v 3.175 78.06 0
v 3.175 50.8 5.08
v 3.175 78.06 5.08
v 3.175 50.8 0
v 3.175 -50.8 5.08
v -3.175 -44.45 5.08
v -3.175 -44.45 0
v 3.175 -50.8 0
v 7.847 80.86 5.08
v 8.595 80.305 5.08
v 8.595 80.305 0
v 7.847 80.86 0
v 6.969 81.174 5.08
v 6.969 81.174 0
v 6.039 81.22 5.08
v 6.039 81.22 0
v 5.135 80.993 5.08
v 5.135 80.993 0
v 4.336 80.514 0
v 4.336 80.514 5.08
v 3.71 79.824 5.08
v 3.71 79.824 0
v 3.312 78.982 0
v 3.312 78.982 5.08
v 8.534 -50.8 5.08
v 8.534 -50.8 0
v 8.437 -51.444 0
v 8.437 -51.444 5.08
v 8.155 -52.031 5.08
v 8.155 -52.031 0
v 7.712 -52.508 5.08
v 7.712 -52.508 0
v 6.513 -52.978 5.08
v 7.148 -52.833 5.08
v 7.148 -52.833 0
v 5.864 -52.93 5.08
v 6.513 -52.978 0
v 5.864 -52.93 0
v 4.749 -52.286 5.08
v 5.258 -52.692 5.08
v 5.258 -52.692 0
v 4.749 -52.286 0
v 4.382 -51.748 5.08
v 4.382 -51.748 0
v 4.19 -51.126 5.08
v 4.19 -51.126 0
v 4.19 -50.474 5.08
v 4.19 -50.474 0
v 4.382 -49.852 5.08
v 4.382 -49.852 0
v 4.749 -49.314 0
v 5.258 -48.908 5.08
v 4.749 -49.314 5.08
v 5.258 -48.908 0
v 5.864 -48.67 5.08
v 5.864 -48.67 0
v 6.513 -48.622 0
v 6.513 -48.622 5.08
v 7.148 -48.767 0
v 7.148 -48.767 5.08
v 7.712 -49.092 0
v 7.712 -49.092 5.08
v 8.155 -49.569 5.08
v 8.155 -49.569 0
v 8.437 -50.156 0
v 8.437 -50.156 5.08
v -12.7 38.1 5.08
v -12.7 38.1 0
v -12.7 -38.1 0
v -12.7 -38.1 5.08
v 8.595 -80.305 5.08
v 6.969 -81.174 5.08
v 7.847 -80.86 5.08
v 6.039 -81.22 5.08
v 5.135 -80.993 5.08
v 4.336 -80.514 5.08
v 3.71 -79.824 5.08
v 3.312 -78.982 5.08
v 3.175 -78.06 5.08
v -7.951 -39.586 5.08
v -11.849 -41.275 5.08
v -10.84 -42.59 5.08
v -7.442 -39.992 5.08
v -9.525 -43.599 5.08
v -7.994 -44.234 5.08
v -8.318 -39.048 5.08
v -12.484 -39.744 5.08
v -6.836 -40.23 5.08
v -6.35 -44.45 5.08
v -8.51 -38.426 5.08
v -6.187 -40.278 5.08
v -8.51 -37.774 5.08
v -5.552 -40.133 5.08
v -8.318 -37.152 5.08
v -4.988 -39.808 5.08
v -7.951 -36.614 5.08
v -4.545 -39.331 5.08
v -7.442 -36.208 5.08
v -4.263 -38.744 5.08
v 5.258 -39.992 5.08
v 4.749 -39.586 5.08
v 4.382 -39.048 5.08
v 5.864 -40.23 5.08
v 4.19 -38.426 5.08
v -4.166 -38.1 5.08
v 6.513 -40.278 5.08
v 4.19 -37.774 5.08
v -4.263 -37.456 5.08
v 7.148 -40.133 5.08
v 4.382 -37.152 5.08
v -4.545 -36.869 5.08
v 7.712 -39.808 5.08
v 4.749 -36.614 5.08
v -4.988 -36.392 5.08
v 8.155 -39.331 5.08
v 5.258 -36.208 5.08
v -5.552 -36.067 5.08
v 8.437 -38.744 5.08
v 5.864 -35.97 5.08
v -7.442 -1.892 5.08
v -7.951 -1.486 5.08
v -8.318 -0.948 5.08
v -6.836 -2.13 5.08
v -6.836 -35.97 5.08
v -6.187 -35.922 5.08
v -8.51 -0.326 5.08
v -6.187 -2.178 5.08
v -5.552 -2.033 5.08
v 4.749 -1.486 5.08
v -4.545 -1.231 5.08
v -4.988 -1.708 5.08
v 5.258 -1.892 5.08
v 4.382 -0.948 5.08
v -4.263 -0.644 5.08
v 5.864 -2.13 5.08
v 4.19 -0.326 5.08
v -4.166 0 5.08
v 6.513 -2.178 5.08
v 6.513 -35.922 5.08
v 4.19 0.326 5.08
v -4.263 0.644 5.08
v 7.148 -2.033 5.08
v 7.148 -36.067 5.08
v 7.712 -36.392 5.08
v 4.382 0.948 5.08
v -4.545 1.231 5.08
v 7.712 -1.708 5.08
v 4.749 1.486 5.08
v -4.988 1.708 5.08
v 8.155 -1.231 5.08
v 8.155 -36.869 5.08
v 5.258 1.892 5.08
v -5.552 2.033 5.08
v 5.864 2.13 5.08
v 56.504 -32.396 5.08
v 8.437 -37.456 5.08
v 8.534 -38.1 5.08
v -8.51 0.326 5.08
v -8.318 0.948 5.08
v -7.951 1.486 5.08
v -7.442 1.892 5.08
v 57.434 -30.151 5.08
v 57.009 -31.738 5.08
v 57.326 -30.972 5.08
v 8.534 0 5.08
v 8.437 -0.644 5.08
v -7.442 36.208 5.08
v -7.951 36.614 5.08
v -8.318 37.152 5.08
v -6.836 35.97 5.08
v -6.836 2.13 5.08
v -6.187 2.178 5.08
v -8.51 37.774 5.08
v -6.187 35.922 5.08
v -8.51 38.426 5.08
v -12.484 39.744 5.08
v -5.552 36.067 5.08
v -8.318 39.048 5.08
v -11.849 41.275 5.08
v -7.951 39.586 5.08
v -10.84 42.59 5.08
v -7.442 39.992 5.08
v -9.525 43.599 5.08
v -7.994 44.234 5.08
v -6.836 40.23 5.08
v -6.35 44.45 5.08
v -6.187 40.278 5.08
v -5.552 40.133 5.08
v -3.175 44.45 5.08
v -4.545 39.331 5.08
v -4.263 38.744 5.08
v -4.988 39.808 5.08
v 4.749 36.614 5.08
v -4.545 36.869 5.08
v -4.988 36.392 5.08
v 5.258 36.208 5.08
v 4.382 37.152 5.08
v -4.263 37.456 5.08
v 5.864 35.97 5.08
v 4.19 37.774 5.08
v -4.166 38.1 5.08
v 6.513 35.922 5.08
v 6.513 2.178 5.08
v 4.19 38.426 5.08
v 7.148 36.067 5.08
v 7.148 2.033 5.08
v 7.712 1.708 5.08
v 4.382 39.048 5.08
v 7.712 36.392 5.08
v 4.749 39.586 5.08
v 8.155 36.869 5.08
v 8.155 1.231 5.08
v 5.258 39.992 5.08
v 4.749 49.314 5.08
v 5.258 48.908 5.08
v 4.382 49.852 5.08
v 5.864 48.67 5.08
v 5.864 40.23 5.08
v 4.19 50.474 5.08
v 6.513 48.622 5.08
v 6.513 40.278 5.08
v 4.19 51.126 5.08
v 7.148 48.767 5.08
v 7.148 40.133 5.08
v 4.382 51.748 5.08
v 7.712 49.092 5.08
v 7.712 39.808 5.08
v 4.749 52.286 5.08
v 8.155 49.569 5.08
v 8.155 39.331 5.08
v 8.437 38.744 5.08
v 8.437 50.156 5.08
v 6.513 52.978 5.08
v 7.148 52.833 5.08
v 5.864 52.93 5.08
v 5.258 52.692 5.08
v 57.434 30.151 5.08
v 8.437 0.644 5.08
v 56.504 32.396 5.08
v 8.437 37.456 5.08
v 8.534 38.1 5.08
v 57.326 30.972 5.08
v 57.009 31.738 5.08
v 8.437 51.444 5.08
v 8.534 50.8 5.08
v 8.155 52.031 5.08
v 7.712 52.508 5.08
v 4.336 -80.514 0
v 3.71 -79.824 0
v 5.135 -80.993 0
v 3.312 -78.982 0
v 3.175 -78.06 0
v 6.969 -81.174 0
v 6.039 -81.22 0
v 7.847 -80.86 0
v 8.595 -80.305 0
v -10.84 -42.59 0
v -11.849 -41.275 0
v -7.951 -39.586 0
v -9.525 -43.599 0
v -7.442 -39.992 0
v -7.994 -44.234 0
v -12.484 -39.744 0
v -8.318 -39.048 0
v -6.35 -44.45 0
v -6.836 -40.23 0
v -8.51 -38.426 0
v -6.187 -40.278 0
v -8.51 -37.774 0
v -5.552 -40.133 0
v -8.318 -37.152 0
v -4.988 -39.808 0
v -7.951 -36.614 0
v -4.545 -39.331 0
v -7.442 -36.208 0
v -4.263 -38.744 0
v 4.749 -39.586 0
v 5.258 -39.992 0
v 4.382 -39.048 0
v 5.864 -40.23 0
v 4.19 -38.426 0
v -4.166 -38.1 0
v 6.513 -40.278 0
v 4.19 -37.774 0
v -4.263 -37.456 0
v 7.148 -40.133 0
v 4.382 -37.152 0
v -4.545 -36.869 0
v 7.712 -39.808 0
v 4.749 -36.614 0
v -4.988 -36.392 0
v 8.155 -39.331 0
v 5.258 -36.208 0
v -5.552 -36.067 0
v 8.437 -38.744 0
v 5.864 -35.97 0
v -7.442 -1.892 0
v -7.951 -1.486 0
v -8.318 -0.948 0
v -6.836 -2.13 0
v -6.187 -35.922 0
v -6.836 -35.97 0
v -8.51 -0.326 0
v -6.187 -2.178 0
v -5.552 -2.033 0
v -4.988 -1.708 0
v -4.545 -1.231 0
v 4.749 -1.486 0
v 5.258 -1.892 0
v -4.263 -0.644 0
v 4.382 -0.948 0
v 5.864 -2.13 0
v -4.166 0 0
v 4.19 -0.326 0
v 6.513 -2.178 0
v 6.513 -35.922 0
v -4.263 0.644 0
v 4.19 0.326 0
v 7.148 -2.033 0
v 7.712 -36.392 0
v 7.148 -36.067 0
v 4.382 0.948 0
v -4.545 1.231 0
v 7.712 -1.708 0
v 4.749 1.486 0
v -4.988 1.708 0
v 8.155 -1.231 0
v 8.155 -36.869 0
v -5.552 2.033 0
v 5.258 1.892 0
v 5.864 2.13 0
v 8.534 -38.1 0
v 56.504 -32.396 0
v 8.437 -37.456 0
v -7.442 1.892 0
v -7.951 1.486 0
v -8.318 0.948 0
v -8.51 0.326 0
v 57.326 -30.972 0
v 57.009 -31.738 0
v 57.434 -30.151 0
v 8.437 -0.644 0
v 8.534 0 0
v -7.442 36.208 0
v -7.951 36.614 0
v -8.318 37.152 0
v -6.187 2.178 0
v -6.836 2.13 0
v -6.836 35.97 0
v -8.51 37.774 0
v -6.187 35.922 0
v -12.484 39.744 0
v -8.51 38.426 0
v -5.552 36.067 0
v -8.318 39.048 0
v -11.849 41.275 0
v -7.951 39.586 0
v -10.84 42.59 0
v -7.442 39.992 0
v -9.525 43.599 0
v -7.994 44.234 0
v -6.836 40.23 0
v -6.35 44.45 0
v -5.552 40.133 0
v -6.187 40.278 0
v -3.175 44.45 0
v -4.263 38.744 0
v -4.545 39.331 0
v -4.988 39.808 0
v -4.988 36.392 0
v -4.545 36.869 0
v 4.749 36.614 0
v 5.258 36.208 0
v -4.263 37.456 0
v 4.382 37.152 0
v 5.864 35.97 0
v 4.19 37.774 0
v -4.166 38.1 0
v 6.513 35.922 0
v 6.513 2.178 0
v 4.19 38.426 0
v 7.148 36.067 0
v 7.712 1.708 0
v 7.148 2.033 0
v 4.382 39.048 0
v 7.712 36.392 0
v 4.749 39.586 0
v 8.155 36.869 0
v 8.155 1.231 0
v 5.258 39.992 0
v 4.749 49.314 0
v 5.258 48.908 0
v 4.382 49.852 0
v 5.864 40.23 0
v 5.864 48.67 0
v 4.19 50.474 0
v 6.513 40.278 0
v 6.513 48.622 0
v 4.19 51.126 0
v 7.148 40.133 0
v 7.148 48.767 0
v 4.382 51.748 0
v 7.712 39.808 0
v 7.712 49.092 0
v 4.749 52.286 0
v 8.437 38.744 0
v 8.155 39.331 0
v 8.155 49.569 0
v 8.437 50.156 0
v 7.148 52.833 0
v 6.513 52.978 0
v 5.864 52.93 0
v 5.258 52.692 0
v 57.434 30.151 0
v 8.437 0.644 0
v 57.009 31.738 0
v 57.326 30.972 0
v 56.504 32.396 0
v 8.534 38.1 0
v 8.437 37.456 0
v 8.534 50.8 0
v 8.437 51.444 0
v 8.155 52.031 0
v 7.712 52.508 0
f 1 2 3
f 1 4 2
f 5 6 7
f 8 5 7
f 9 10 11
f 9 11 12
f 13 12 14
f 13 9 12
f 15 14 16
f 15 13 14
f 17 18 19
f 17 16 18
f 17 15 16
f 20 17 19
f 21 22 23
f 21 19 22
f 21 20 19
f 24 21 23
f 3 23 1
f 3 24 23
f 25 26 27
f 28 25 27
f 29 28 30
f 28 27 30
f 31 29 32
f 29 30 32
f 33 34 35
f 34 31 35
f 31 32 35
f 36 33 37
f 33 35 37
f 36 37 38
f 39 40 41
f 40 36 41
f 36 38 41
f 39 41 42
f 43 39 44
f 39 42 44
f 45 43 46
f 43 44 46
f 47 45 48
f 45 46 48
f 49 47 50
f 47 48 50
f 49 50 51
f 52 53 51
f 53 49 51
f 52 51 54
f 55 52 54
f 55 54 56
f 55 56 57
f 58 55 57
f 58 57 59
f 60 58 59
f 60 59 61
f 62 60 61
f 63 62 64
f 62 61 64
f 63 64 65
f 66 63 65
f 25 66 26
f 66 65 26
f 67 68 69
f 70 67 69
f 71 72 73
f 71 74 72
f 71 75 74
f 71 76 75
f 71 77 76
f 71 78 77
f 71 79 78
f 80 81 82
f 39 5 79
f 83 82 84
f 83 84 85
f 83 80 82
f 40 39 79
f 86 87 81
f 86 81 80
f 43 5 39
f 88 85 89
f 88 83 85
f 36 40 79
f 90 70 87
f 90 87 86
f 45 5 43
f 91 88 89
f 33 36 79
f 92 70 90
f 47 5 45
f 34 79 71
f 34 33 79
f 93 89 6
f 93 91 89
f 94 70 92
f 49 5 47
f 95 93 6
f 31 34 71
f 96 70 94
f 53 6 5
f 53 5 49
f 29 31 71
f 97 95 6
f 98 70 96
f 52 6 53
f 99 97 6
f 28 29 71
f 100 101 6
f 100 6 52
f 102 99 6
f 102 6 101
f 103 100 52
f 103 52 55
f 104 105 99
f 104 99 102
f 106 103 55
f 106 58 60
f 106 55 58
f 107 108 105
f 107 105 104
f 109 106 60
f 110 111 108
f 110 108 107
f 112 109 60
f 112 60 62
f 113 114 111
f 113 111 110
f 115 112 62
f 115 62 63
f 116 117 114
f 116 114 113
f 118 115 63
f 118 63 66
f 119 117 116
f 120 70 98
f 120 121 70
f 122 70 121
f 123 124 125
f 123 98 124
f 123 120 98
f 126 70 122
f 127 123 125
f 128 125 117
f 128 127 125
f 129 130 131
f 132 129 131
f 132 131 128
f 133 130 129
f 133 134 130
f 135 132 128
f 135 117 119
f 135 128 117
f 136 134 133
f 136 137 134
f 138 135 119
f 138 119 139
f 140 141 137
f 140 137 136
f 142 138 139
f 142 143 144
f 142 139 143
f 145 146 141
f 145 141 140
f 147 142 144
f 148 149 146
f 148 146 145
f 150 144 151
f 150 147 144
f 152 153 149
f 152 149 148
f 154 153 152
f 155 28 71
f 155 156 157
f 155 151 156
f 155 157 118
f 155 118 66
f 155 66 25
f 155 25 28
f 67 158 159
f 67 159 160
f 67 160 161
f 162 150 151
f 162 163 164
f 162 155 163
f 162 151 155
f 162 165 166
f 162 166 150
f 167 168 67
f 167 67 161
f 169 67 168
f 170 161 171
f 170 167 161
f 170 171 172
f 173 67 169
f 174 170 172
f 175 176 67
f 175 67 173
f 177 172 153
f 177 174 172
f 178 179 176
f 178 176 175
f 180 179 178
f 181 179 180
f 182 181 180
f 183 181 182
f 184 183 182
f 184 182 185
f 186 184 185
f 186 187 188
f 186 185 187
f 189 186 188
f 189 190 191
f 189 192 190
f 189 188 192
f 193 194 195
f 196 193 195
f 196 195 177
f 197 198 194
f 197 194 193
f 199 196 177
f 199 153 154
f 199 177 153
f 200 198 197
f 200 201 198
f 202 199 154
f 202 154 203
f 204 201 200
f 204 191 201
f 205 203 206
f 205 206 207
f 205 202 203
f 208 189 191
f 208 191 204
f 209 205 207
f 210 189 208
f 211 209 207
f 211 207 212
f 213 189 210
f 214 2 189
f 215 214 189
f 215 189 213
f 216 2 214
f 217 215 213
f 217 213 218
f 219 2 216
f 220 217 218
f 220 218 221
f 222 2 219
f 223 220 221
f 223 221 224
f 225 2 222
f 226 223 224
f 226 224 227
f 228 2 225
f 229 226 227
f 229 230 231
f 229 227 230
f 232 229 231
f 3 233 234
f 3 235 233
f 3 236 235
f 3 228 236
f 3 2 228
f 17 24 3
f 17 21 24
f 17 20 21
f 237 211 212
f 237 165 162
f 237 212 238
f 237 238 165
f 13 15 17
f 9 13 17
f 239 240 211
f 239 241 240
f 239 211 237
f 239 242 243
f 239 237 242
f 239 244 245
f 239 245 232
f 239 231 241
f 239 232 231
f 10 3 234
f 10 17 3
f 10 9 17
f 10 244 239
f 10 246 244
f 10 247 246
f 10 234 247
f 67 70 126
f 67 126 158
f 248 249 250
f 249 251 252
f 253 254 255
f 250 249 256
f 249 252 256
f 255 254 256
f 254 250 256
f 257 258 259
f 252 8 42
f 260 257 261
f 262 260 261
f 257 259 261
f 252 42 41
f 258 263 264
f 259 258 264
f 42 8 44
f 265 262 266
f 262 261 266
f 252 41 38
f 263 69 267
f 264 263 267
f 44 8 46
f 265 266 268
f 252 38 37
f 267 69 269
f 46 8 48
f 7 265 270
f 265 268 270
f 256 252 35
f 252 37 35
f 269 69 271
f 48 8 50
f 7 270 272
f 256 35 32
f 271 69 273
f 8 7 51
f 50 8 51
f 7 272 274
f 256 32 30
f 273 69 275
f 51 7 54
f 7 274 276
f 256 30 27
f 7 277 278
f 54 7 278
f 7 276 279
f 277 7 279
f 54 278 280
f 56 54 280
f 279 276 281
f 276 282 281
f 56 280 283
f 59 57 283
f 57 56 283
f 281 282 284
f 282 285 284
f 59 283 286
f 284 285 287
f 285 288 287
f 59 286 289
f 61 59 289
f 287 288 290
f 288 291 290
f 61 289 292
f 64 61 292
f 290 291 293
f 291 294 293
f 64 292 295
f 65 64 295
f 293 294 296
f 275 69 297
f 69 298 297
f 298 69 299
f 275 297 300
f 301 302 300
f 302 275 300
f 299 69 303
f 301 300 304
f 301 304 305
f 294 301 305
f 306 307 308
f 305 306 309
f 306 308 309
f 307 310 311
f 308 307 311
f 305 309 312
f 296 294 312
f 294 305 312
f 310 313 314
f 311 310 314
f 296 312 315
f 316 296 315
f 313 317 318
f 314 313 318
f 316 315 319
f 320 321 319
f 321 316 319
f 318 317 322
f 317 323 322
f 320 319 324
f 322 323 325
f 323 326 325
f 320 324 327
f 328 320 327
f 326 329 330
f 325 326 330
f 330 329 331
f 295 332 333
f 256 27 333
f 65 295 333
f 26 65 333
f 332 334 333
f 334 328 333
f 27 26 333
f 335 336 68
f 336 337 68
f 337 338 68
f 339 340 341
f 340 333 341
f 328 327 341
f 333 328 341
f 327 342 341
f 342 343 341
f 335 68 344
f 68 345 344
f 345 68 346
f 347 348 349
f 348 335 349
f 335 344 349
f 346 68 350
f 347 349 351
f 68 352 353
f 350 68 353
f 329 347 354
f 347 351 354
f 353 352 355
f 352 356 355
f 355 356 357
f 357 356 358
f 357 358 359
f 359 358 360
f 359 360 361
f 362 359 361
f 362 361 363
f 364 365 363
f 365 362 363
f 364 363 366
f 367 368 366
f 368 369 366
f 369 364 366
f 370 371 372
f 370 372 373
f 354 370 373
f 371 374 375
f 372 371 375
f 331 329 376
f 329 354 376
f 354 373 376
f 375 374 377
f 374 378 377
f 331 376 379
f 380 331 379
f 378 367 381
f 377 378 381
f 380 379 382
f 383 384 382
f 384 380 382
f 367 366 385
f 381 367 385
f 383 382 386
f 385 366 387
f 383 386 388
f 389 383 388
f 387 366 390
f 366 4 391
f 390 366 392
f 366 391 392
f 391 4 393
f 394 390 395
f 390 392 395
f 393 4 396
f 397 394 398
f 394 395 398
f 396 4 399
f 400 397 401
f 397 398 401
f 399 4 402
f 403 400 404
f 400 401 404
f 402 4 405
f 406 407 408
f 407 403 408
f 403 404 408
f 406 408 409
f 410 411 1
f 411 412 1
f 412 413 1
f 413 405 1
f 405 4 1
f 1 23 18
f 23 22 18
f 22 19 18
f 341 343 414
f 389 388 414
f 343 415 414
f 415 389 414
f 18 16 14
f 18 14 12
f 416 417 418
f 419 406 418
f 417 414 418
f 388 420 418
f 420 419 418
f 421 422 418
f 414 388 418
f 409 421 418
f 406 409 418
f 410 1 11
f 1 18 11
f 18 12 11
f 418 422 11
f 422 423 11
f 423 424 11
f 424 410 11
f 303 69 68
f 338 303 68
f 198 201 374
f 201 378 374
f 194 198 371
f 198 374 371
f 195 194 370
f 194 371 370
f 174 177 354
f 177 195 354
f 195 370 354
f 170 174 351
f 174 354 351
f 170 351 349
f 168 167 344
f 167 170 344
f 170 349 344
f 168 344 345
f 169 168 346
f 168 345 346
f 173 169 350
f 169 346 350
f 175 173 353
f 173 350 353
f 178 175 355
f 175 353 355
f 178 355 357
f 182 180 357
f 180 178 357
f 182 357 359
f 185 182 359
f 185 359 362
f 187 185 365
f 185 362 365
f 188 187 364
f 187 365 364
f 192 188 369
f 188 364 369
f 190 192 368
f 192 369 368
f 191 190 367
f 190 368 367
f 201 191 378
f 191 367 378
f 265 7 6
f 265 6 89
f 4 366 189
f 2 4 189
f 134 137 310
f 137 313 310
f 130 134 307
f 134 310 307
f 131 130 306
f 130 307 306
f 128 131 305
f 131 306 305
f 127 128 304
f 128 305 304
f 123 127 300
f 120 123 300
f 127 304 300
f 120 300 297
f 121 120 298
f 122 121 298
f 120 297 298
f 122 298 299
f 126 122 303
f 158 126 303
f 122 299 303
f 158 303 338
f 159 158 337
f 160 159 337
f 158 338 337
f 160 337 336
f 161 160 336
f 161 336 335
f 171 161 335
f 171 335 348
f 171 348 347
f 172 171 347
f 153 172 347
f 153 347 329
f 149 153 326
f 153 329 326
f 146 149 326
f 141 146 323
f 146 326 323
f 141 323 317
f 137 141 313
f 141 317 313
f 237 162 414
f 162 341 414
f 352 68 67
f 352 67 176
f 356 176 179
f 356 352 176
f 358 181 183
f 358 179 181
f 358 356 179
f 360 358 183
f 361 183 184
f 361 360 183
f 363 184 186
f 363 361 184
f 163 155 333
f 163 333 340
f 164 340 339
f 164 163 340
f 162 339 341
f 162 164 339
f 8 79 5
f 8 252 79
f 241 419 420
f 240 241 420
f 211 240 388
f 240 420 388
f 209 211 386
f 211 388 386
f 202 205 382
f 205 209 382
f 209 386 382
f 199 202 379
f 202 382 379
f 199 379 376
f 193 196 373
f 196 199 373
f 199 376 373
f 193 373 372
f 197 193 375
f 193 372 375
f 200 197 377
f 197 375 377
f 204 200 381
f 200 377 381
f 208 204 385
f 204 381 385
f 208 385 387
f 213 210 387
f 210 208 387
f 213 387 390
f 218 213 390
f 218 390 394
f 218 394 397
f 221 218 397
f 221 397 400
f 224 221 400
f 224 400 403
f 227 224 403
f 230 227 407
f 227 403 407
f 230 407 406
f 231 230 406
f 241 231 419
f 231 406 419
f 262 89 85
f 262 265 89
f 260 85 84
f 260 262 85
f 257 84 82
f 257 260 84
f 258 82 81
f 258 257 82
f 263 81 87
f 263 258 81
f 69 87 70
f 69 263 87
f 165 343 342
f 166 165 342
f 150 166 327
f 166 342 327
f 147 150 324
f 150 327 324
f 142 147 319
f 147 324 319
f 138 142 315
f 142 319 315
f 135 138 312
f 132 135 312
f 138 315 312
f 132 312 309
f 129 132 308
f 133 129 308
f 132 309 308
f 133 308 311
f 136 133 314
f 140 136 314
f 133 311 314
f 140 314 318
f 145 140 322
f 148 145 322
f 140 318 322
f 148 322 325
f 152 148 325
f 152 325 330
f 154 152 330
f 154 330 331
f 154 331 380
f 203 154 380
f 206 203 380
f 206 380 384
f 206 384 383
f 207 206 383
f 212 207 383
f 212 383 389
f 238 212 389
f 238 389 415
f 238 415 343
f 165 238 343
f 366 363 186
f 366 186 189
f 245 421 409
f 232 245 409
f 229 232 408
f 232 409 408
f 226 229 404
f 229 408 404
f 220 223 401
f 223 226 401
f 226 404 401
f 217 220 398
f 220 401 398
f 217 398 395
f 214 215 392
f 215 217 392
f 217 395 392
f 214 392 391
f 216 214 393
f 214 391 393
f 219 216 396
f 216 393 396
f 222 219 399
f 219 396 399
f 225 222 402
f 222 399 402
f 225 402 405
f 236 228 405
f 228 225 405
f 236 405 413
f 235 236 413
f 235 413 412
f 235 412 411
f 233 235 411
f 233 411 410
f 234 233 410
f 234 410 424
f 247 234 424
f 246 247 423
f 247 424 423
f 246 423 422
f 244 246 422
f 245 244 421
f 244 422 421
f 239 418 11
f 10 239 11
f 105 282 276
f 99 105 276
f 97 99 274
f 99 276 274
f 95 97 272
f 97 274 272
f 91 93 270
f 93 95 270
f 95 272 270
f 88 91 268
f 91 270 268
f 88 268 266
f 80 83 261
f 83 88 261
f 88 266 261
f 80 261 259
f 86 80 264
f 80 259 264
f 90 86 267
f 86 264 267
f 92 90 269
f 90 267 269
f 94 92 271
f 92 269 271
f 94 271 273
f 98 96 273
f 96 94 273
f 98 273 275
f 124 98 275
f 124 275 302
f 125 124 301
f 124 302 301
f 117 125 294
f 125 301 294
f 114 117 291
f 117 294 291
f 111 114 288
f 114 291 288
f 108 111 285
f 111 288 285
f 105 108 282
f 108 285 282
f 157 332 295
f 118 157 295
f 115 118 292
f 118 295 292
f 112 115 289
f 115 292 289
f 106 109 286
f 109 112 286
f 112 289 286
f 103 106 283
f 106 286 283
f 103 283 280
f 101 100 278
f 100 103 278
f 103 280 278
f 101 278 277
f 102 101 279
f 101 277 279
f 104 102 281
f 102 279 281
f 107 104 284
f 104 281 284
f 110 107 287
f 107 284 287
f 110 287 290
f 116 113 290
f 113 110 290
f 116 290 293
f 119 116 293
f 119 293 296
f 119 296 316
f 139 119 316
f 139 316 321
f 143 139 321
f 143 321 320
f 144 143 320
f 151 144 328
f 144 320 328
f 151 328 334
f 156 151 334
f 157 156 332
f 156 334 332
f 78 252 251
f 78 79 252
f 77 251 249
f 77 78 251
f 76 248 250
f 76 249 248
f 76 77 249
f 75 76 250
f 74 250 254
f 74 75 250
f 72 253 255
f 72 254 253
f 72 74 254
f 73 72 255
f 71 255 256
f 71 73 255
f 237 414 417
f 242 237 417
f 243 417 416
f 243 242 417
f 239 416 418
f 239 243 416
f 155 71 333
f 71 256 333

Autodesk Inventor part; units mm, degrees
ref_plane "YZ Plane" through (0, 0, 0) normal (1, 0, 0) x (0, 1, 0)
ref_plane "XZ Plane" through (0, 0, 0) normal (0, 1, 0) x (-1, 0, 0)
ref_plane "XY Plane" through (0, 0, 0) normal (0, 0, 1) x (1, 0, 0)
sketch "Sketch1" plane through (0, 0, 0) normal (0, 0, 1) x (1, 0, 0)
  line L0 (88.9, 0) -> (-12.7, 101.6)
  line L1 (-12.7, 101.6) -> (-12.7, -101.6)
  line L2 (-12.7, -101.6) -> (88.9, 0)
  line L3 (-12.7, 0) -> (88.9, 0)
  line L4 (57.4343, 183.898) -> (-323.5657, 183.898)
  line L5 (-323.5657, 183.898) -> (-323.5657, -183.898)
  line L6 (-323.5657, -183.898) -> (57.4343, -183.898)
  line L7 (57.4343, -183.898) -> (57.4343, 183.898)
  line L8 (57.4343, 183.898) -> (-323.5657, -183.898) construction
  line L9 (-323.5657, 183.898) -> (57.4343, -183.898) construction
  circle A0 centre (6.35, 38.1) radius 2.1844 projected
  circle A1 centre (-6.35, 38.1) radius 2.1844 projected
  circle A2 centre (-6.35, -38.1) radius 2.1844 projected
  circle A3 centre (6.35, -38.1) radius 2.1844 projected
  circle A4 centre (6.35, 0) radius 2.1844 projected
  circle A5 centre (6.35, 88.9) radius 2.1844 projected
  circle A6 centre (6.35, 50.8) radius 2.1844 projected
  circle A7 centre (6.35, -50.8) radius 2.1844 projected
  circle A8 centre (-6.35, 0) radius 2.1844 projected
  circle A9 centre (-6.35, 38.1) radius 6.35
  circle A10 centre (-6.35, -38.1) radius 6.35
  line L10 (3.175, -85.725) -> (3.175, -44.45)
  line L11 (3.175, -44.45) -> (-11.204, -44.45)
  line L12 (-10.742, 44.45) -> (3.175, 44.45)
  line L13 (3.175, 44.45) -> (3.175, 85.725)
  point P0 (0, 0)
  point P1 (-133.0657, 0)
  point P2 (57.4343, 31.4657)
  point P3 (-6.35, 44.45)
  point P4 (-12.7, 38.1)
  point P5 (-12.7, -38.1)
  point P6 (-6.35, -44.45)
  point P7 (57.4343, -31.4657)
  dimension "d0" = 101.6
  dimension "d2" = 381
  dimension "d4" = 12.7
  dimension "d5" = 12.7
  dimension "d6" = 3.175
  dimension "d7" = 3.175
extrude "Extrusion1" add sketch "Sketch1" along normal blind 5.08 contours L0 L7 L3 A4 A8 L1 A9 L12 L13 | A9 | L7 L2 L10 L11 A10 L1 L3 A8 A4 | A10
chamfer "Chamfer1" distance 6.35 angle 45 2 edges at (3.175, 44.45, 2.54) (3.175, -44.45, 2.54)
fillet "Fillet1" radius 3.175 4 edges at (3.175, 85.725, 2.54) (3.175, -85.725, 2.54) (57.4343, 31.4657, 2.54) (57.4343, -31.4657, 2.54)
properties part number "wedge"
